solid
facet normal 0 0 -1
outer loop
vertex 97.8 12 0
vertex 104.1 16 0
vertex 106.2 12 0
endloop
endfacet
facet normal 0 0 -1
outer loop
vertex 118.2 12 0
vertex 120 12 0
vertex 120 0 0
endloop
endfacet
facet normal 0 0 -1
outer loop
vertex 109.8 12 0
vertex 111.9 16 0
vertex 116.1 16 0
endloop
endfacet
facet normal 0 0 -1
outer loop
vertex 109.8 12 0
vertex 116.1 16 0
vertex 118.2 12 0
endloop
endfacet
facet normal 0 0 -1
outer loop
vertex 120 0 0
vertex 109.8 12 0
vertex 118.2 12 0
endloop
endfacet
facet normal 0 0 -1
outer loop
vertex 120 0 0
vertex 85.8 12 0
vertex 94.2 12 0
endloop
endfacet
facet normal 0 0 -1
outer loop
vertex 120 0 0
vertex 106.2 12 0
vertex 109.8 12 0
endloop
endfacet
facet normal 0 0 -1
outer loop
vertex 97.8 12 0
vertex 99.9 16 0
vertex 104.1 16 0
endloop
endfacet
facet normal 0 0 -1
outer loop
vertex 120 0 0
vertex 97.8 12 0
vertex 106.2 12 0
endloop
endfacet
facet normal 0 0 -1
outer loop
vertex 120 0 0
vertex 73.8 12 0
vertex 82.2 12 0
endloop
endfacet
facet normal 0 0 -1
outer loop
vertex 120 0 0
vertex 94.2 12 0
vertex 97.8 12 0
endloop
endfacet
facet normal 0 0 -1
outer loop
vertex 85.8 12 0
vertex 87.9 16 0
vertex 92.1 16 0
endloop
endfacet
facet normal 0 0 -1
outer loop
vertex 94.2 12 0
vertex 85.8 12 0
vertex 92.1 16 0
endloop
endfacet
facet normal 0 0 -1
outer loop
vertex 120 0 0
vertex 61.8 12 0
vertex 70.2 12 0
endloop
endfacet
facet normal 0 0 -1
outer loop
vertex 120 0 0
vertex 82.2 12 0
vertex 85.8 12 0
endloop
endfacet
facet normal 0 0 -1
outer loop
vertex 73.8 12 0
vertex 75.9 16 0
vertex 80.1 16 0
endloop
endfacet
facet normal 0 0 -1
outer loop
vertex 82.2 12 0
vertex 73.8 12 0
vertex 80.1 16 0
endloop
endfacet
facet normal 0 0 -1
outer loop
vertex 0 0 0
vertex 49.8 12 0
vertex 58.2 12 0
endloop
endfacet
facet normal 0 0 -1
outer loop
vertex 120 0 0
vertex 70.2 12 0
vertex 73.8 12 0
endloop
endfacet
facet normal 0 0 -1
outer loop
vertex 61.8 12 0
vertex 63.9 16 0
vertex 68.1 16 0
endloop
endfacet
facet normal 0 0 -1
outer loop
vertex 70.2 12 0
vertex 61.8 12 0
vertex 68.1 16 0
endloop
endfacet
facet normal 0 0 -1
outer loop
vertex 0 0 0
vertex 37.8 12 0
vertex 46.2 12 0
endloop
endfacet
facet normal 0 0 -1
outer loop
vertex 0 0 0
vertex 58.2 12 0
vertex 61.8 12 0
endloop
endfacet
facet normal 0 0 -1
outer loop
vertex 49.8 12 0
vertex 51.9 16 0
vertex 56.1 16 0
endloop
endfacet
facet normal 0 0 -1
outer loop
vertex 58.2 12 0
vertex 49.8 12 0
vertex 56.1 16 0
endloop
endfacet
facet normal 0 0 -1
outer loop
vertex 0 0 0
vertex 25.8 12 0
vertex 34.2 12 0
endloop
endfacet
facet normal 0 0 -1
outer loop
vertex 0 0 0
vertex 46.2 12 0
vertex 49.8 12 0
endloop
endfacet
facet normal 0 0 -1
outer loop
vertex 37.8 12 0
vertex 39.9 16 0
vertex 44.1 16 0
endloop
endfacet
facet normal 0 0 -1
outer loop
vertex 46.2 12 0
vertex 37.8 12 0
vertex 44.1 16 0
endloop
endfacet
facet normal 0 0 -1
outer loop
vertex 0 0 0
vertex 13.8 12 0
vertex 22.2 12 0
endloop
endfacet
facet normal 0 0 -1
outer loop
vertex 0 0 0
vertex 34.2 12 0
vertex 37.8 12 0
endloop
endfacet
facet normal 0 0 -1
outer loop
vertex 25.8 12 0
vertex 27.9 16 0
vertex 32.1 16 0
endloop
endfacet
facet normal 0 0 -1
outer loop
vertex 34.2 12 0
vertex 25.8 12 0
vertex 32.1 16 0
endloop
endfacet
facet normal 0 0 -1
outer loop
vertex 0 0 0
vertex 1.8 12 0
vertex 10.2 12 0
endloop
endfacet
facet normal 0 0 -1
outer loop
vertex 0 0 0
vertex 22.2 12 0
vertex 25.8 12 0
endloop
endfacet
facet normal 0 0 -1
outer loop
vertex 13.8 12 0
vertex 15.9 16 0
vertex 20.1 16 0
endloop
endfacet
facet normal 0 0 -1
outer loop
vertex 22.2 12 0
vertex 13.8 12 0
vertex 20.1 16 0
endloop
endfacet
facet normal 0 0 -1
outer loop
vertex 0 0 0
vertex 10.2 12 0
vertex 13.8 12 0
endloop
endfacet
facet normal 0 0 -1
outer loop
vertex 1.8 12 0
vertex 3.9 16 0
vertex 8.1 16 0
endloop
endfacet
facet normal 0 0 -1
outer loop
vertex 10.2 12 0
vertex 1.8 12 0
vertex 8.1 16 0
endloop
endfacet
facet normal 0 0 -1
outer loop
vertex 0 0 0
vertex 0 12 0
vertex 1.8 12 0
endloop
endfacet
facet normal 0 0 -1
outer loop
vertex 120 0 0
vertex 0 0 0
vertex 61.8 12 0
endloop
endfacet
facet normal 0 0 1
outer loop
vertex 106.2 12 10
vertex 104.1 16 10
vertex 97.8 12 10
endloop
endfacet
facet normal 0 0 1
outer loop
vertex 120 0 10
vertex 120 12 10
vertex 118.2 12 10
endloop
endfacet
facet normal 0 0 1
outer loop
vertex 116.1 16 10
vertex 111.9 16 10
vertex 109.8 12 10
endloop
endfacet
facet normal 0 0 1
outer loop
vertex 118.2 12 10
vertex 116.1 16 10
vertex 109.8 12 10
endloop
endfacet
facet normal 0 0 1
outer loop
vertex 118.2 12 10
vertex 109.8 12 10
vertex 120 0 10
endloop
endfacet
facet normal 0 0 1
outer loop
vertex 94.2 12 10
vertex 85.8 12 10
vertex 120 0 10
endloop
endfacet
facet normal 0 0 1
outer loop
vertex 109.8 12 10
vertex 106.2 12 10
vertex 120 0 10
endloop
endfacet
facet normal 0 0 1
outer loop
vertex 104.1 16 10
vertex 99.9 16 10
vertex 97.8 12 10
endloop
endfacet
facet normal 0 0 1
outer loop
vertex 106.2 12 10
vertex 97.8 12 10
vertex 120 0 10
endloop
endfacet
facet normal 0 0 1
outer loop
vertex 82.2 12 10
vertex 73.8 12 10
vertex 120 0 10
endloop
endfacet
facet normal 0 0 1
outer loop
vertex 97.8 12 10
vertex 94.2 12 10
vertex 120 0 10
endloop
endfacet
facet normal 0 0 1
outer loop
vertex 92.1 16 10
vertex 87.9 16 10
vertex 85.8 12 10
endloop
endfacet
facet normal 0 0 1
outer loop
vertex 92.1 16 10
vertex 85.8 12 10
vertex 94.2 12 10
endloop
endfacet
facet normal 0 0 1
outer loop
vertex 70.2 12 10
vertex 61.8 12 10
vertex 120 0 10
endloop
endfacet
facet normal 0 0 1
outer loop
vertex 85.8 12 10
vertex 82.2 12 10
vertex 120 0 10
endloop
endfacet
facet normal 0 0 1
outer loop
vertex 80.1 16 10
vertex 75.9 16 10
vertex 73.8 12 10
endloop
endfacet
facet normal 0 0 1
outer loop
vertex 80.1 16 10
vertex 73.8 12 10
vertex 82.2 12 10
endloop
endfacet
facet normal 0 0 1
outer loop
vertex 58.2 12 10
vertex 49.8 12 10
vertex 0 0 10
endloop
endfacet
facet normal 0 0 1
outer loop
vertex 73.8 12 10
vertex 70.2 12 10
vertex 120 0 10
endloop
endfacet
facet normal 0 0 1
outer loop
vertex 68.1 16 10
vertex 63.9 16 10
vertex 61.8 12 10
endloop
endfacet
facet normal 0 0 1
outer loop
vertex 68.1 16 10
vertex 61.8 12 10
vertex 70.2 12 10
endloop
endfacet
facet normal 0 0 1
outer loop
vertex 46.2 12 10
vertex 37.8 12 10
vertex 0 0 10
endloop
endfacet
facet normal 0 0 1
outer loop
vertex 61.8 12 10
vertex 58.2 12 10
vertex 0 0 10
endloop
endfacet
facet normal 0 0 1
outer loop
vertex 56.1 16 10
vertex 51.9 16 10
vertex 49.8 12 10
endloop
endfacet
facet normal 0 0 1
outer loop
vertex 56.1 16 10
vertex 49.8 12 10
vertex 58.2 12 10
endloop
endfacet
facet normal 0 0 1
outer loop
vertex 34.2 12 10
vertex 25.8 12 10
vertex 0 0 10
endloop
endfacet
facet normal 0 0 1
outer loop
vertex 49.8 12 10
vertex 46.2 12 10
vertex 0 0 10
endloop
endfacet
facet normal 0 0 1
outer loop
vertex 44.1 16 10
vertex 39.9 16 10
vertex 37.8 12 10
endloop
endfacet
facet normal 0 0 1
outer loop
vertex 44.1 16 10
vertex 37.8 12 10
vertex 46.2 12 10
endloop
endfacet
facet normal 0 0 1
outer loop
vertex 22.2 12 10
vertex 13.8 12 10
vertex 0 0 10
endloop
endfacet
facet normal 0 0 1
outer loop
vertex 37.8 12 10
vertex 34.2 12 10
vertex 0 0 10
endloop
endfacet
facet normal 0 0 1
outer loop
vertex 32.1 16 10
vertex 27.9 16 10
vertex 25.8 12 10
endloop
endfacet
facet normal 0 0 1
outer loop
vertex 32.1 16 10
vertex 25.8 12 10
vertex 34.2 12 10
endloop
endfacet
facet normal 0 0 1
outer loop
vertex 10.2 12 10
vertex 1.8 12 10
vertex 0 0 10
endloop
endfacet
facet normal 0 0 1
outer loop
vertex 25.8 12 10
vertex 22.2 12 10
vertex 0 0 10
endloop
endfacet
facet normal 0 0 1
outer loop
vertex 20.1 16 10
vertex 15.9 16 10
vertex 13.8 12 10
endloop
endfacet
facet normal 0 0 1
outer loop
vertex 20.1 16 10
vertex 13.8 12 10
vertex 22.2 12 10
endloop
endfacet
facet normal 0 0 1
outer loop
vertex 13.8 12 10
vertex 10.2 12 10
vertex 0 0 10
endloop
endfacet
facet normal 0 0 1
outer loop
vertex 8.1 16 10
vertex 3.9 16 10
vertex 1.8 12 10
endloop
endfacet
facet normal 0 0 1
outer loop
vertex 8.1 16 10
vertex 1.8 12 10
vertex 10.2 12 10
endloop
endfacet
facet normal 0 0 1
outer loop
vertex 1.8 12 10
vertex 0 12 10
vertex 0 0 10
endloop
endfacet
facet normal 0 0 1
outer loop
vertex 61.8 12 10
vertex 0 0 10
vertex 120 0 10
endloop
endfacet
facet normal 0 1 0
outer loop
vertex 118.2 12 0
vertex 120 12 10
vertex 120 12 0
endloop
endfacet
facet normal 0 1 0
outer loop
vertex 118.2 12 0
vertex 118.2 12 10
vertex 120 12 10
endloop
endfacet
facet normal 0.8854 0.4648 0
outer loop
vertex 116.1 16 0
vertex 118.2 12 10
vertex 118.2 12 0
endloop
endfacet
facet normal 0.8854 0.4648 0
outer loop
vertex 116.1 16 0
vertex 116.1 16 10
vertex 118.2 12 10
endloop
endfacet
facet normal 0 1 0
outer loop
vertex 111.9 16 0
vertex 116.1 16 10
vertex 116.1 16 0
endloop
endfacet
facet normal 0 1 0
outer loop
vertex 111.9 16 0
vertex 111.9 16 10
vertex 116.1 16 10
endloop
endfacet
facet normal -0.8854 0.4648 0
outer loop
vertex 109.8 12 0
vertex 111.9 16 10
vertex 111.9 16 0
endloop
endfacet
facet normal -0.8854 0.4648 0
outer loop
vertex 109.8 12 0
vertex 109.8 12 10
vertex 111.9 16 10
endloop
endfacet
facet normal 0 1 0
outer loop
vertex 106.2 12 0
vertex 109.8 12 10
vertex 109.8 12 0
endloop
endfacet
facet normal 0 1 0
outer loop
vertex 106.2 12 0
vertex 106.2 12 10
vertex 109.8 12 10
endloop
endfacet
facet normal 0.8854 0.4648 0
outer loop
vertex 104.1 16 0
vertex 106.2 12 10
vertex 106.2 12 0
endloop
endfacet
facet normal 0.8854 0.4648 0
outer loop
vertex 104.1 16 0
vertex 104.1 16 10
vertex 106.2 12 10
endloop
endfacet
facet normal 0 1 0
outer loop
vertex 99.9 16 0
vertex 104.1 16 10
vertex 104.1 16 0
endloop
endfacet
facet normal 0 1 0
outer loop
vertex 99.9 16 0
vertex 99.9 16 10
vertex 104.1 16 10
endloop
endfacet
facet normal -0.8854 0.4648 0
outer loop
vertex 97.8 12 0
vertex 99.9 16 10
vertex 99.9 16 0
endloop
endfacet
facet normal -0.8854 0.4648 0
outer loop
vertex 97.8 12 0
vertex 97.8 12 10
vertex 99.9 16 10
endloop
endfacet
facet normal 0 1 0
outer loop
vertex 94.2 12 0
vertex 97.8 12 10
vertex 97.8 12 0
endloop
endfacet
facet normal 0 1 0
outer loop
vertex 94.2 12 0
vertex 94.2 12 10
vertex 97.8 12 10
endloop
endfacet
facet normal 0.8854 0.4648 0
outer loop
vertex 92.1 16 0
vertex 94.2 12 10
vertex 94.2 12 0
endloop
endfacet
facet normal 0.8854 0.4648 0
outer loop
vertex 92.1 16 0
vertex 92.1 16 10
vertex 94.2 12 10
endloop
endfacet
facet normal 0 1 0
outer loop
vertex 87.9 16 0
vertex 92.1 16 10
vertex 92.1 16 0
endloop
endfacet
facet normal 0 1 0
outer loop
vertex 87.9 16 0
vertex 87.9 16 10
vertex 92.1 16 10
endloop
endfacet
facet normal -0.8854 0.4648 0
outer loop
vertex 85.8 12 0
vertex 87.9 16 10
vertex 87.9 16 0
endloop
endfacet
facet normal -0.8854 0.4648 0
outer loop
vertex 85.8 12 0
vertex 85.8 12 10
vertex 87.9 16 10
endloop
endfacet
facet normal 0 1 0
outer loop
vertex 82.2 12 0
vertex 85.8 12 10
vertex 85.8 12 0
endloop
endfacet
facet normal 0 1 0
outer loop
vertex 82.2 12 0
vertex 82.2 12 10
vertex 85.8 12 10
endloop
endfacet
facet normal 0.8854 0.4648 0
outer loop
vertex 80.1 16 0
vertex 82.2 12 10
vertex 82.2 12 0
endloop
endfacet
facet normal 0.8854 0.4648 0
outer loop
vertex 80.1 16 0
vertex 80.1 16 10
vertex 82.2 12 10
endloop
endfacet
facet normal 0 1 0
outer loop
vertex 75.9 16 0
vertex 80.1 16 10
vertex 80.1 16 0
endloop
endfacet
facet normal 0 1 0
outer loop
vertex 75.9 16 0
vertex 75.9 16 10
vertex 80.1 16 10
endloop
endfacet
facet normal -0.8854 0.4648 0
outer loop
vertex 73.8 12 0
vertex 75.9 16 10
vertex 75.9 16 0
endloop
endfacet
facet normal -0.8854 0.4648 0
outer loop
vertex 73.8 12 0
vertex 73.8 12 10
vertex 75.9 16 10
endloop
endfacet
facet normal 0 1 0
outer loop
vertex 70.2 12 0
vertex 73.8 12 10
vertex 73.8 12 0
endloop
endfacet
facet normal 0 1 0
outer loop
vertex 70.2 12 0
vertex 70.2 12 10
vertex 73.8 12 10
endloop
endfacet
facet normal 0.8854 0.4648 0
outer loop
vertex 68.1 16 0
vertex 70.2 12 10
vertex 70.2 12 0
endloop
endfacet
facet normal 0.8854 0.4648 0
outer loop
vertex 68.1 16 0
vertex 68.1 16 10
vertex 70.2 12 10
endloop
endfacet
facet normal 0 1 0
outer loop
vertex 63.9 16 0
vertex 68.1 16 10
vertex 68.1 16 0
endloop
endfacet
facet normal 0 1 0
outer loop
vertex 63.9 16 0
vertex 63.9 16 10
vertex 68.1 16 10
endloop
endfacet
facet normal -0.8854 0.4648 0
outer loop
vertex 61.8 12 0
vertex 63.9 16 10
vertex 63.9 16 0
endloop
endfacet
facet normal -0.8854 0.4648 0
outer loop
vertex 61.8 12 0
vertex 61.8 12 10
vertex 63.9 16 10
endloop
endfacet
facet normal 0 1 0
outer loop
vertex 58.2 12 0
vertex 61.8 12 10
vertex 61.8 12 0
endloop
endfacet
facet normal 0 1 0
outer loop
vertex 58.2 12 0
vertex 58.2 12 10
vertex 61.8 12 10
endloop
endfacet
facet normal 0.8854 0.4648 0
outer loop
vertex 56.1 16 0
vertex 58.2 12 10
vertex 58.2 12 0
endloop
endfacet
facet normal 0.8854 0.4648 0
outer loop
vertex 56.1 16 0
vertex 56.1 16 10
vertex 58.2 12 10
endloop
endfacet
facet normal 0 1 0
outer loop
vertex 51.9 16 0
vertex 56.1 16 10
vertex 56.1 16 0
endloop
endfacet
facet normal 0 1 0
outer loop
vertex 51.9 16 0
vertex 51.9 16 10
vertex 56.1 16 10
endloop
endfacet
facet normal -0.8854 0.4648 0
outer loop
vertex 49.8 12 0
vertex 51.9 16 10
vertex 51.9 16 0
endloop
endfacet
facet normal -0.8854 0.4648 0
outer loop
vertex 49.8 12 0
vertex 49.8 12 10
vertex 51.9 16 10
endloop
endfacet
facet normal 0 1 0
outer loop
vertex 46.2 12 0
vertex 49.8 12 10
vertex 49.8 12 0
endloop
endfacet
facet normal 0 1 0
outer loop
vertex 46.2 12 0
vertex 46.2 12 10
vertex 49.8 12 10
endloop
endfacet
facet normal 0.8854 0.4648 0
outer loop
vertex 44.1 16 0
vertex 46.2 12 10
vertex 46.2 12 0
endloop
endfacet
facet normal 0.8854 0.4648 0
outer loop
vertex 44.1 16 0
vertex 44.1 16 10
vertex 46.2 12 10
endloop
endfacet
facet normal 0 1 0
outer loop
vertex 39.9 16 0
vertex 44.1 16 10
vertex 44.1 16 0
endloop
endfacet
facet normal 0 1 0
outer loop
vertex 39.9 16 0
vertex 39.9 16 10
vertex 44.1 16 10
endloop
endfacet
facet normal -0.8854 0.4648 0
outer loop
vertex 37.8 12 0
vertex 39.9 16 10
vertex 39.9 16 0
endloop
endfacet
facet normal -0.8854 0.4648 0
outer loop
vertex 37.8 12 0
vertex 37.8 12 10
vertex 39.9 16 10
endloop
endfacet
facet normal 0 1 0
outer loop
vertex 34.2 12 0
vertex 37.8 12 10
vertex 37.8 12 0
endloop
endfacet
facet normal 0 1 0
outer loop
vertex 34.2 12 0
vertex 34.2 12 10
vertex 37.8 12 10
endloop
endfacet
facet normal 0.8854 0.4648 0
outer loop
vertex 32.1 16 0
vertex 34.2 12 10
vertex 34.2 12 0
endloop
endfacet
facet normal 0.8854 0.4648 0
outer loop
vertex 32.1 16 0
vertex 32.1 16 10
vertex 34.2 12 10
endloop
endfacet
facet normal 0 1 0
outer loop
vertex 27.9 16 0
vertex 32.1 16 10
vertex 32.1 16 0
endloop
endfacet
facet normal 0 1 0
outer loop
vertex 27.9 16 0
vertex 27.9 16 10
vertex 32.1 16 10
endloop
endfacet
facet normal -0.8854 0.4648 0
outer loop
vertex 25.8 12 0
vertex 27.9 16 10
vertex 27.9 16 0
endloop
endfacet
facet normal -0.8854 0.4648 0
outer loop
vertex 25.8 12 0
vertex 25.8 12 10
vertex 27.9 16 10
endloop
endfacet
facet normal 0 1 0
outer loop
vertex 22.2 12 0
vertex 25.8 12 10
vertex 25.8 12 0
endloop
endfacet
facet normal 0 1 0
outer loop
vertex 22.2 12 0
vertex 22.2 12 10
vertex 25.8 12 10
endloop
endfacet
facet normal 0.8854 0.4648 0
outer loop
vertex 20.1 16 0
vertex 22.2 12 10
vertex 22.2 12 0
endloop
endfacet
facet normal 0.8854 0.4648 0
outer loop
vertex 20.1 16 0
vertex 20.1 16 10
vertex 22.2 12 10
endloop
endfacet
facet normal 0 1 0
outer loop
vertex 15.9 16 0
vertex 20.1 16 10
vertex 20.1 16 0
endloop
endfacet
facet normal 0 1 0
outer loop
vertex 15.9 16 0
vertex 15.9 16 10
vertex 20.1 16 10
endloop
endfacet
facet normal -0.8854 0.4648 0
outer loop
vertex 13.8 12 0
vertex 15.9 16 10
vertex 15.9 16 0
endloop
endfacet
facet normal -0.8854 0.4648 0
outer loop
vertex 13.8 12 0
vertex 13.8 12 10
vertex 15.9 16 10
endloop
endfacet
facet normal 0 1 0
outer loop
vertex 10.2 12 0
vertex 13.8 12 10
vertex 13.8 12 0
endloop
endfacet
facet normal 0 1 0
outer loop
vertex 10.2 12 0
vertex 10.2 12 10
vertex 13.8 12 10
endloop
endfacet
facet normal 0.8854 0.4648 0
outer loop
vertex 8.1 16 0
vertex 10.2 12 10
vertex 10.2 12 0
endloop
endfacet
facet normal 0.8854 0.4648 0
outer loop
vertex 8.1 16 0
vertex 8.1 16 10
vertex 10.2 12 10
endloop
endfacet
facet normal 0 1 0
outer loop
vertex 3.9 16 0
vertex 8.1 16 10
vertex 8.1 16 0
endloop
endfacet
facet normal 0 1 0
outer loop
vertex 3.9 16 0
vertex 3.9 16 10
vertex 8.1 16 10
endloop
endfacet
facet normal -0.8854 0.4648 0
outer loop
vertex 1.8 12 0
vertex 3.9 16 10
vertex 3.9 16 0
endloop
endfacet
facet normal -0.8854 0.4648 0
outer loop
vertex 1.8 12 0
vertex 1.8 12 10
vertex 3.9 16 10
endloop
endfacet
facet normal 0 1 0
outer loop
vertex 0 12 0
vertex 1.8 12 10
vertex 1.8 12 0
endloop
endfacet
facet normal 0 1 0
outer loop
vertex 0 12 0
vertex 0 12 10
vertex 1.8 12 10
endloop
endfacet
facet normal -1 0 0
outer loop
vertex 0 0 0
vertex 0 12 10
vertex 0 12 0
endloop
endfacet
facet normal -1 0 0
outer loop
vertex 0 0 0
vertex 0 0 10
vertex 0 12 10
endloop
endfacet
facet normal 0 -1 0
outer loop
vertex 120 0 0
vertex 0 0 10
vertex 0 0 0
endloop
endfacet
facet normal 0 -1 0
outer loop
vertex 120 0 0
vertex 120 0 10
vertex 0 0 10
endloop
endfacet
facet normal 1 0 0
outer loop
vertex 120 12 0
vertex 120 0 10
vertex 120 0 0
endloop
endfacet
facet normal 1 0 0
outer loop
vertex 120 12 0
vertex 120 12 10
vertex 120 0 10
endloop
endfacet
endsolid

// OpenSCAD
$fn = 32;

// ----------------------------------------------------------------------
// Gear rack: 10 teeth, pitch 12 mm
// ----------------------------------------------------------------------

// --- parameters (mm) ---
teeth = 10;               // number of teeth
pitch = 12;               // tooth pitch, X
root_w = 8.4;             // tooth width at the root
tip_w = 4.2;              // tooth width at the tip
base_h = 12;              // rack body height, Y
tooth_h = 4;              // tooth height above the body
plate_t = 10;             // rack width, Z (extrusion height)

rack_l = teeth * pitch;  // overall length
total_h = base_h + tooth_h;  // overall height

profile = [[0, 0], [120, 0], [120, 12], [118.2, 12], [116.1, 16], [111.9, 16], [109.8, 12], [106.2, 12], [104.1, 16], [99.9, 16], [97.8, 12], [94.2, 12], [92.1, 16], [87.9, 16], [85.8, 12], [82.2, 12], [80.1, 16], [75.9, 16], [73.8, 12], [70.2, 12], [68.1, 16], [63.9, 16], [61.8, 12], [58.2, 12], [56.1, 16], [51.9, 16], [49.8, 12], [46.2, 12], [44.1, 16], [39.9, 16], [37.8, 12], [34.2, 12], [32.1, 16], [27.9, 16], [25.8, 12], [22.2, 12], [20.1, 16], [15.9, 16], [13.8, 12], [10.2, 12], [8.1, 16], [3.9, 16], [1.8, 12], [0, 12]];  // primary outline, 44 points, counter clockwise

// --- the one profile operation ---
linear_extrude(height = plate_t) polygon(points = profile);
